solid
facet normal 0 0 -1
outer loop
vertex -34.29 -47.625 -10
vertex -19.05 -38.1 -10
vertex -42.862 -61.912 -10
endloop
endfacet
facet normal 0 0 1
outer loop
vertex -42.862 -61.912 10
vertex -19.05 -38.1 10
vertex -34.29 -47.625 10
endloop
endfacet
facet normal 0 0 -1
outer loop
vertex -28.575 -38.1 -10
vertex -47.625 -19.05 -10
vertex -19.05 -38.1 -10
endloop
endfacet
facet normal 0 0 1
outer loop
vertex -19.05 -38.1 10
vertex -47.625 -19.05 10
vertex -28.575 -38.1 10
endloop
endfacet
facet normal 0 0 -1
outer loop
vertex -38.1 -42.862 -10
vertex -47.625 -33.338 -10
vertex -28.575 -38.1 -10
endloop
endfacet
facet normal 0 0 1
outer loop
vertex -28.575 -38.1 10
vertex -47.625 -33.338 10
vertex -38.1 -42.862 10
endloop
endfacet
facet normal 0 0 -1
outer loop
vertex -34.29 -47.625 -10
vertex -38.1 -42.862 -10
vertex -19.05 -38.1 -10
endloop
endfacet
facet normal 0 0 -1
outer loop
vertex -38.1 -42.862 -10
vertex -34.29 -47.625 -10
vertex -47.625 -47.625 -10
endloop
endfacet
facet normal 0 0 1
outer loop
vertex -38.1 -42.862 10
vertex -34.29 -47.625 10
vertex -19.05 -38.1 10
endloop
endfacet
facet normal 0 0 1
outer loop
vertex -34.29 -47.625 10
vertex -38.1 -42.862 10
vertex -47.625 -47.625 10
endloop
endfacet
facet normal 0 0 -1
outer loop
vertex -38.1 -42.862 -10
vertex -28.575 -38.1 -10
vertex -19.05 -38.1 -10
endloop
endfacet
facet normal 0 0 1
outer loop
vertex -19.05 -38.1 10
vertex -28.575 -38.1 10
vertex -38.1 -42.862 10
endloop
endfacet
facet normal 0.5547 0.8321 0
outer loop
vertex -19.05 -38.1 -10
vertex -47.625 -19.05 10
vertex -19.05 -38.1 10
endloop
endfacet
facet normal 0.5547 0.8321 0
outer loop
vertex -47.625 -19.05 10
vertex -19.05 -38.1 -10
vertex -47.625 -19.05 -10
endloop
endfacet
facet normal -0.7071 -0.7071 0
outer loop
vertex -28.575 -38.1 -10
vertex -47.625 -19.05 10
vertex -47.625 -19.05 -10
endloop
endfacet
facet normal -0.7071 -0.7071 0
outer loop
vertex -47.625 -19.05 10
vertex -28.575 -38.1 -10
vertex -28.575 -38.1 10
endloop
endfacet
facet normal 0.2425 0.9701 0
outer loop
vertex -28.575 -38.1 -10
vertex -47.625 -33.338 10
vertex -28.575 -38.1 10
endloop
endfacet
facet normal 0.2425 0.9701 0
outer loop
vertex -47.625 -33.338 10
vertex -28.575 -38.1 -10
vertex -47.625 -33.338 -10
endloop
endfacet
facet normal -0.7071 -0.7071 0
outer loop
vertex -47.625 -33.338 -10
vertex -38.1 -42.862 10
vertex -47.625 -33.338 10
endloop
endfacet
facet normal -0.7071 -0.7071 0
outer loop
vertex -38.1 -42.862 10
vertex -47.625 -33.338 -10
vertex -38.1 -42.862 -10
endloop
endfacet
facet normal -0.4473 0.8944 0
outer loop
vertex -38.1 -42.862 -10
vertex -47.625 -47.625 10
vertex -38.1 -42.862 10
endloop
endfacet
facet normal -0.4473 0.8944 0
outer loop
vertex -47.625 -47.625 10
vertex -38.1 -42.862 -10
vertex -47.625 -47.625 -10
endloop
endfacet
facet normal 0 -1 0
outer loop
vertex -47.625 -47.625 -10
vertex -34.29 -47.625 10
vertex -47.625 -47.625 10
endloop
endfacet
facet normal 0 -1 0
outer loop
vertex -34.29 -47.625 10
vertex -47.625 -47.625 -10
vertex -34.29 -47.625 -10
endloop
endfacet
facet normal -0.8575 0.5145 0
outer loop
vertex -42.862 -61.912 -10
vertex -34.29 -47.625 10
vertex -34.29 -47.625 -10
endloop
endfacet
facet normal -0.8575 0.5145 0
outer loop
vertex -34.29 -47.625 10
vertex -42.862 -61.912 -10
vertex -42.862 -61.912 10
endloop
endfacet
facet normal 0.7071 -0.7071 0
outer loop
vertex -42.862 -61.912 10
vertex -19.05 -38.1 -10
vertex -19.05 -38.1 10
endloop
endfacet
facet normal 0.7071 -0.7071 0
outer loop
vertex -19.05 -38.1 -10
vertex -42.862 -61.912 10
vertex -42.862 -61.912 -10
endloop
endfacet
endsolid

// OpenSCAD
polyhedron(
    points=[
    [-19.05, -38.1, -10],
    [-47.625, -19.05, -10],
    [-28.575, -38.1, -10],
    [-47.625, -33.3375, -10],
    [-38.1, -42.8625, -10],
    [-47.625, -47.625, -10],
    [-34.29, -47.625, -10],
    [-42.8625, -61.9125, -10],
    [-19.05, -38.1, 10],
    [-47.625, -19.05, 10],
    [-28.575, -38.1, 10],
    [-47.625, -33.3375, 10],
    [-38.1, -42.8625, 10],
    [-47.625, -47.625, 10],
    [-34.29, -47.625, 10],
    [-42.8625, -61.9125, 10],
    ],
    faces=[
        [7,0,6],
        [14,8,15],
        [0,1,2],
        [10,9,8],
        [2,3,4],
        [12,11,10],
        [6,0,4,5],
        [13,12,8,14],
        [0,2,4],
        [12,10,8],
        [0,8,9,1],
        [1,9,10,2],
        [2,10,11,3],
        [3,11,12,4],
        [4,12,13,5],
        [5,13,14,6],
        [6,14,15,7],
        [7,15,8,0],
    ]
);
